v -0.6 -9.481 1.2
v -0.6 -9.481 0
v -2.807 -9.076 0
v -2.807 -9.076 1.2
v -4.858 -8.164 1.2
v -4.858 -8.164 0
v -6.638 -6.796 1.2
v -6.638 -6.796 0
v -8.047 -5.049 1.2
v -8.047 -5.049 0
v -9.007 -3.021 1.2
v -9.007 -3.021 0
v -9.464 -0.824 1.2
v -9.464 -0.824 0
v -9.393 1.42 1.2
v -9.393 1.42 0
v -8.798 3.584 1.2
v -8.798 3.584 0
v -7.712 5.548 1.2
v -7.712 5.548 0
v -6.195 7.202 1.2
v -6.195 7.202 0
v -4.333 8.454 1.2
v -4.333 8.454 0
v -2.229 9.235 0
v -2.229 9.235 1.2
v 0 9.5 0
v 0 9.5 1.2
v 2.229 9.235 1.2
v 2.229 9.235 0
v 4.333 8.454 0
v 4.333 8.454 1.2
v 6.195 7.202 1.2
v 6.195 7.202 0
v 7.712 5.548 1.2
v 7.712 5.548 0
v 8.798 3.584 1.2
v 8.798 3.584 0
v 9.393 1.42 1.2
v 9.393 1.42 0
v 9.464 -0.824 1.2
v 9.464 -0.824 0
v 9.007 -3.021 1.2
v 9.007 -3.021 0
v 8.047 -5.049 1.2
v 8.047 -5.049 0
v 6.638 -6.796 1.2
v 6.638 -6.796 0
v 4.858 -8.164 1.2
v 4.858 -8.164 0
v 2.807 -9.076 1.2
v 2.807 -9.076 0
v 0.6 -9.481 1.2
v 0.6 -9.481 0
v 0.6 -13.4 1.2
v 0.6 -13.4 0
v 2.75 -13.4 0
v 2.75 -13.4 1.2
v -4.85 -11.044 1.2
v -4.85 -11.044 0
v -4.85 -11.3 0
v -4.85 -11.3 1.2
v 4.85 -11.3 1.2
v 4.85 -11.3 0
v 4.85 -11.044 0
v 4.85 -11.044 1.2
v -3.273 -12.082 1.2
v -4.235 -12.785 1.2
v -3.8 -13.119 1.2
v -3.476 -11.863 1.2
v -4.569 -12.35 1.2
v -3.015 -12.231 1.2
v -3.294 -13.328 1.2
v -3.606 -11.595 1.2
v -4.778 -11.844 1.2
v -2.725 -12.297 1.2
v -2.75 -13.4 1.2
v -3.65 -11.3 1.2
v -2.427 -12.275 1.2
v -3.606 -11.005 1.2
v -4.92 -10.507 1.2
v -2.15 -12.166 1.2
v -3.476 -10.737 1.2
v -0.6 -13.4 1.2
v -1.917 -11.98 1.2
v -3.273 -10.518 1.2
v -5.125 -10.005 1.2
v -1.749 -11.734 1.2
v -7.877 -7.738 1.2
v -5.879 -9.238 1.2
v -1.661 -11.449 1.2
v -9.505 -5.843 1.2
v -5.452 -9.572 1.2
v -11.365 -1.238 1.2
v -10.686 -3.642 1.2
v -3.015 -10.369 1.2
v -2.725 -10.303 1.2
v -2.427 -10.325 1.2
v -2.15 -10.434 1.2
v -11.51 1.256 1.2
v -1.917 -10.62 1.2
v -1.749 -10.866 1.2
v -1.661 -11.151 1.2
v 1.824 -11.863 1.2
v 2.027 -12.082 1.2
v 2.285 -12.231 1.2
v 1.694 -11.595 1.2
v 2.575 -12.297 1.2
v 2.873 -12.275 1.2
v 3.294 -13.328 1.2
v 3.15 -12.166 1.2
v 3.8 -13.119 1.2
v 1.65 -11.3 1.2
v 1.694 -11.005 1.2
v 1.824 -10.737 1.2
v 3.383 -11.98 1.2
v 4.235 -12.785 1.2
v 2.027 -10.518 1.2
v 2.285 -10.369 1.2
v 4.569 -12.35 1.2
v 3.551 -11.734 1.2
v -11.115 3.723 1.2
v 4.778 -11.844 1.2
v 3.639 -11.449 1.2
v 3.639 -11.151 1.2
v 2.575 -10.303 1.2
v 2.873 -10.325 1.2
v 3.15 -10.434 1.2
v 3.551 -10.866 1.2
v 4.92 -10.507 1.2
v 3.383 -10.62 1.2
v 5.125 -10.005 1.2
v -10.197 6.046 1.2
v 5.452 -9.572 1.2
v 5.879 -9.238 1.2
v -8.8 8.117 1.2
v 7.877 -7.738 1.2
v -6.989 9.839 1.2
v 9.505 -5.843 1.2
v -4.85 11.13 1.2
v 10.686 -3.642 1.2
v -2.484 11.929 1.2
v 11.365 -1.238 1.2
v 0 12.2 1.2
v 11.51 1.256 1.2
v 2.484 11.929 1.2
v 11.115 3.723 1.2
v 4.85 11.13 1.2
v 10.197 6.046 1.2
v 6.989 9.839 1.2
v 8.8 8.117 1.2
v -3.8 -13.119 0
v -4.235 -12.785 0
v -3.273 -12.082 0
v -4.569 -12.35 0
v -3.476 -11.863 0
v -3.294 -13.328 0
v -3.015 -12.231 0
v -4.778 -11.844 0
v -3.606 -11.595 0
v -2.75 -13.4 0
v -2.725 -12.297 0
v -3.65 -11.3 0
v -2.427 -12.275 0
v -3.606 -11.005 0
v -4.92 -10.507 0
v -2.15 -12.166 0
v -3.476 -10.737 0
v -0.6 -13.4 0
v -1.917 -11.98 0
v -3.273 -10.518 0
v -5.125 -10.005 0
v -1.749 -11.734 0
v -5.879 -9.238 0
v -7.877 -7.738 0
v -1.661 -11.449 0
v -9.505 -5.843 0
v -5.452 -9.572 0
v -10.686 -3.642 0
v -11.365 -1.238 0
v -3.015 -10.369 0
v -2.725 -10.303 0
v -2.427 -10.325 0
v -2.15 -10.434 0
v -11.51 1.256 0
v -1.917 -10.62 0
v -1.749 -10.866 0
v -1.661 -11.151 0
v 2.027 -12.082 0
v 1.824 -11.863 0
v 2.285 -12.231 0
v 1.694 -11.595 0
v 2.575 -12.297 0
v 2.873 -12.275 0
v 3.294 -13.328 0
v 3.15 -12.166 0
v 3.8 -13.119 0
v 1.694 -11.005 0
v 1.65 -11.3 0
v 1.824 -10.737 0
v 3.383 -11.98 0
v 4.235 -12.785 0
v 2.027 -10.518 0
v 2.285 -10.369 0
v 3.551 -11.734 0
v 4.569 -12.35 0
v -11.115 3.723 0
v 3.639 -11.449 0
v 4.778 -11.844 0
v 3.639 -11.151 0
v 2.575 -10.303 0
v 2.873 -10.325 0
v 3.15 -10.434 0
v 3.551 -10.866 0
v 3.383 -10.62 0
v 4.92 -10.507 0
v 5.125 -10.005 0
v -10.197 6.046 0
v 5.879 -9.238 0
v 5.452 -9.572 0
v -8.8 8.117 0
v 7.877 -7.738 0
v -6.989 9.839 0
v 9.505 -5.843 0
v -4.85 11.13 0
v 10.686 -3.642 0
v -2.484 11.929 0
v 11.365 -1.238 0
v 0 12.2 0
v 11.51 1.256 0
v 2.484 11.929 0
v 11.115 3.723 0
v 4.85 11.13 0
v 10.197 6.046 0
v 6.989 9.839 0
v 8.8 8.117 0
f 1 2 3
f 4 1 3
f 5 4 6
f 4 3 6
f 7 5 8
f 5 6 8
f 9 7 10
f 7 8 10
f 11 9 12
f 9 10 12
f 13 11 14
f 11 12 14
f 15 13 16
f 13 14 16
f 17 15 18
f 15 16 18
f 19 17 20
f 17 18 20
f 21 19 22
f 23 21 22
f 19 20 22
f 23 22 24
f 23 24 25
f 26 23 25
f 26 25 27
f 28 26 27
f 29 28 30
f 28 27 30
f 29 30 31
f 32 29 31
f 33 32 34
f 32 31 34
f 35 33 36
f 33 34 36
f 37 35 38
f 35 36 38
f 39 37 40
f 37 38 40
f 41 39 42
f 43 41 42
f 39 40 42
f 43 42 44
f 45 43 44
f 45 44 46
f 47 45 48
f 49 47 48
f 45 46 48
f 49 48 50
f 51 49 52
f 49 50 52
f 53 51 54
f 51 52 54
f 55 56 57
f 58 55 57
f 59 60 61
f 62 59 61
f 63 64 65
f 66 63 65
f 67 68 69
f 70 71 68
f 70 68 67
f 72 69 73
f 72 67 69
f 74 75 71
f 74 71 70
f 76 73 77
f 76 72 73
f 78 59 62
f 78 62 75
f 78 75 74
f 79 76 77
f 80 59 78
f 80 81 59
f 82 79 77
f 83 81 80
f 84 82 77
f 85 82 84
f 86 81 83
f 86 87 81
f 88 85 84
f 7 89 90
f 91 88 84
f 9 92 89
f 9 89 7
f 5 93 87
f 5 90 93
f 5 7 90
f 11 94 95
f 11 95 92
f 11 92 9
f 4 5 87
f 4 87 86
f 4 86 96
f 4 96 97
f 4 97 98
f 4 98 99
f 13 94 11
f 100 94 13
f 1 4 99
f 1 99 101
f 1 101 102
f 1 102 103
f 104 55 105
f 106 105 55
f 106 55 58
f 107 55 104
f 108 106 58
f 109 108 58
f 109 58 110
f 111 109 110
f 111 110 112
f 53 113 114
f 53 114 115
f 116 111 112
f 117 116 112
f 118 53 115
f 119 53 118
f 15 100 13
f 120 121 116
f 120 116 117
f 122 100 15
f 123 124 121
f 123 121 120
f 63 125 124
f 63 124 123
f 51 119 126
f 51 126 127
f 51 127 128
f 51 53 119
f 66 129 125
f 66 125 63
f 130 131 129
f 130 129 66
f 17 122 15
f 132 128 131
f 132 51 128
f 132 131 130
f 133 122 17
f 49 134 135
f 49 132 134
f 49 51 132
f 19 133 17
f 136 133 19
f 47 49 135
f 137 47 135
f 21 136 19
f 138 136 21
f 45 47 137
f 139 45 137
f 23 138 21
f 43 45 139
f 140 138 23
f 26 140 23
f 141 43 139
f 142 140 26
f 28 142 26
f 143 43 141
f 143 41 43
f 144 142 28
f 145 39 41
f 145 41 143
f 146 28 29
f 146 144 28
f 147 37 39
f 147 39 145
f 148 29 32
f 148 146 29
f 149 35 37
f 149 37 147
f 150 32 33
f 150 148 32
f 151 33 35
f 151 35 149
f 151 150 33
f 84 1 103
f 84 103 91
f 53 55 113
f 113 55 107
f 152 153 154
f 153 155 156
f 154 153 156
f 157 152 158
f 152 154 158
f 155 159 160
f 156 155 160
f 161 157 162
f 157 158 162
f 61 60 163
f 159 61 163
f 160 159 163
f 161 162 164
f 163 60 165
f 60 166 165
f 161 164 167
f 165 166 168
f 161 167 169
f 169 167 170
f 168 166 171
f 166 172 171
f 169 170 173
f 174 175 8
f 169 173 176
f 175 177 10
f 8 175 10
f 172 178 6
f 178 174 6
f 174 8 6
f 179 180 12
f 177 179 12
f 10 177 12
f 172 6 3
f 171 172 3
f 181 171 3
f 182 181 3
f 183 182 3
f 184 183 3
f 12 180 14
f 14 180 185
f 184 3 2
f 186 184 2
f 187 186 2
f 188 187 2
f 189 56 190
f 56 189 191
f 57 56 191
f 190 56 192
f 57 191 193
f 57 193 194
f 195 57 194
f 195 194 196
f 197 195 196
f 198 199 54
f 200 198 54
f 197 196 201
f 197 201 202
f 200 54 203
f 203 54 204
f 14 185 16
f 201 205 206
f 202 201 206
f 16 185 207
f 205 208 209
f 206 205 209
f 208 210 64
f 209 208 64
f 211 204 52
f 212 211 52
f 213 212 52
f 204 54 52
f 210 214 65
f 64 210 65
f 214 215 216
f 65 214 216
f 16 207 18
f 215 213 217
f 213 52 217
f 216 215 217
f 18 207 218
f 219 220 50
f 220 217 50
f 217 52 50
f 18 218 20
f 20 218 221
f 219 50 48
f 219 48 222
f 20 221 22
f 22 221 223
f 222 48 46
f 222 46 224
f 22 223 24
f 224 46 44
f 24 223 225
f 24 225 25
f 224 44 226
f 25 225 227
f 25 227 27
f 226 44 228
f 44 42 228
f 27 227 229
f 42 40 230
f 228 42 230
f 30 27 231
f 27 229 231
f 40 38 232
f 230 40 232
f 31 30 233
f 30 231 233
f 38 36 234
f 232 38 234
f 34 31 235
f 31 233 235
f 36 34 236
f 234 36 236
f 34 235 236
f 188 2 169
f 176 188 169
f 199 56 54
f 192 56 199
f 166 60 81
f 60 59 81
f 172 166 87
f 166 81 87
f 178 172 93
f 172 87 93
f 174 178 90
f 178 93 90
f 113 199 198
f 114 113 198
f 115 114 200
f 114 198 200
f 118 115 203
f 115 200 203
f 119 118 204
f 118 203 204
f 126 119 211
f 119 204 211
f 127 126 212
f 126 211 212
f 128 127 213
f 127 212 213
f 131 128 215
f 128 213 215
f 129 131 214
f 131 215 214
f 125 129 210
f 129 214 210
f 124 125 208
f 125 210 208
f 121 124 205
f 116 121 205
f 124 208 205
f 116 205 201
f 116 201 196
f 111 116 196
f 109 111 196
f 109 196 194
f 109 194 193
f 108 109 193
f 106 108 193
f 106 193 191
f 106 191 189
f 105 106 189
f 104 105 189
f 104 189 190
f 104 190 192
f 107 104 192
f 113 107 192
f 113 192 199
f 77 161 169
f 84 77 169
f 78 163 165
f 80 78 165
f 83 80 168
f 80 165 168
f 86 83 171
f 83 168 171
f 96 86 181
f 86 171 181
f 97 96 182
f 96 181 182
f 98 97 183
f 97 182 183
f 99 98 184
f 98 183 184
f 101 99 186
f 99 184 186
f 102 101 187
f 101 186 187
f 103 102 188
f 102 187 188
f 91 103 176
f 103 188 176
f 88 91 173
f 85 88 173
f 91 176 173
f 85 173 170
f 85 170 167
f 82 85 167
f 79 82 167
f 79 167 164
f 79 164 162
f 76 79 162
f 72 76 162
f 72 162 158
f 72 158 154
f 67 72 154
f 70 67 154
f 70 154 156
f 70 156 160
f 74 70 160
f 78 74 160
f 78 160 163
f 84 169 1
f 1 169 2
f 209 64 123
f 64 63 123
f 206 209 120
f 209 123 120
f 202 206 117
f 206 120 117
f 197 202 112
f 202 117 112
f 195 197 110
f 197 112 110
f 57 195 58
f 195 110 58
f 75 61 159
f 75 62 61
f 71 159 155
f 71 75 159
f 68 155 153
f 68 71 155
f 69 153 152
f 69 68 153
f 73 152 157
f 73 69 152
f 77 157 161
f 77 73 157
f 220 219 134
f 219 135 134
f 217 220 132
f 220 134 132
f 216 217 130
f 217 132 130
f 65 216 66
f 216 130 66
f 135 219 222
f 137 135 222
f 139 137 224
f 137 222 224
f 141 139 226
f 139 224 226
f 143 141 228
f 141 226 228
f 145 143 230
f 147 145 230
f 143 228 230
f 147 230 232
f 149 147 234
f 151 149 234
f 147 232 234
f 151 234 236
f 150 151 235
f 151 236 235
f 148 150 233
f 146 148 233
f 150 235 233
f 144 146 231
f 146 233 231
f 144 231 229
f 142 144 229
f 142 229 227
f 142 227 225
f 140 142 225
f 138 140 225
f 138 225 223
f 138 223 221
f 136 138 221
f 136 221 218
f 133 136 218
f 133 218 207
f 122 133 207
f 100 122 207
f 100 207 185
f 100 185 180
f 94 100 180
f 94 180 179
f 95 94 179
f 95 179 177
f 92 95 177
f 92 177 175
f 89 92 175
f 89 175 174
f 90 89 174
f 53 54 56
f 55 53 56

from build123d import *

# Parameters (mm, degrees)
BOSS_EXTRUDE1_DEPTH = 1.2
SKETCH2_R           = 1
CUT_EXTRUDE1_DEPTH  = 18.715124188
FILLET1_R           = 2.1
FILLET2_R           = 2.1


with BuildPart() as part:
    # Sketch1 → Boss-Extrude1 (new body)
    with BuildSketch(Plane.XY):
        with BuildLine():
            Line((-4.85, -9.779813485), (-4.85, -13.4))
            Line((-4.85, -13.4), (-0.6, -13.4))
            Line((-0.6, -13.4), (-0.6, -9.481033699))
            ThreePointArc((-0.6, -9.481033699), (0, 9.5), (0.6, -9.481033699))
            Line((0.6, -9.481033699), (0.6, -13.4))
            Line((0.6, -13.4), (4.85, -13.4))
            Line((4.85, -13.4), (4.85, -9.779813485))
            ThreePointArc((4.85, -9.779813485), (0, 12.2), (-4.85, -9.779813485))
        make_face()
    extrude(amount=BOSS_EXTRUDE1_DEPTH)

    # Sketch2 → Cut-Extrude1 (cut, through all)
    with BuildSketch(Plane(origin=(0, 0, 0), x_dir=(-1, 0, 0), z_dir=(0, 0, -1))):
        with Locations((-2.65, -11.3)):
            Circle(SKETCH2_R)
        with Locations((2.65, -11.3)):
            Circle(SKETCH2_R)
    extrude(amount=-CUT_EXTRUDE1_DEPTH, mode=Mode.SUBTRACT)

    # Fillet1
    fillet1_edges = [part.edges().sort_by_distance(p)[0] for p in [
        (4.85, -9.779813485, 0.6),
        (-4.85, -9.779813485, 0.6),
    ]]
    fillet(fillet1_edges, radius=FILLET1_R)

    # Fillet2
    fillet2_edges = [part.edges().sort_by_distance(p)[0] for p in [
        (4.85, -13.4, 0.6),
        (-4.85, -13.4, 0.6),
    ]]
    fillet(fillet2_edges, radius=FILLET2_R)


solid = part.part
